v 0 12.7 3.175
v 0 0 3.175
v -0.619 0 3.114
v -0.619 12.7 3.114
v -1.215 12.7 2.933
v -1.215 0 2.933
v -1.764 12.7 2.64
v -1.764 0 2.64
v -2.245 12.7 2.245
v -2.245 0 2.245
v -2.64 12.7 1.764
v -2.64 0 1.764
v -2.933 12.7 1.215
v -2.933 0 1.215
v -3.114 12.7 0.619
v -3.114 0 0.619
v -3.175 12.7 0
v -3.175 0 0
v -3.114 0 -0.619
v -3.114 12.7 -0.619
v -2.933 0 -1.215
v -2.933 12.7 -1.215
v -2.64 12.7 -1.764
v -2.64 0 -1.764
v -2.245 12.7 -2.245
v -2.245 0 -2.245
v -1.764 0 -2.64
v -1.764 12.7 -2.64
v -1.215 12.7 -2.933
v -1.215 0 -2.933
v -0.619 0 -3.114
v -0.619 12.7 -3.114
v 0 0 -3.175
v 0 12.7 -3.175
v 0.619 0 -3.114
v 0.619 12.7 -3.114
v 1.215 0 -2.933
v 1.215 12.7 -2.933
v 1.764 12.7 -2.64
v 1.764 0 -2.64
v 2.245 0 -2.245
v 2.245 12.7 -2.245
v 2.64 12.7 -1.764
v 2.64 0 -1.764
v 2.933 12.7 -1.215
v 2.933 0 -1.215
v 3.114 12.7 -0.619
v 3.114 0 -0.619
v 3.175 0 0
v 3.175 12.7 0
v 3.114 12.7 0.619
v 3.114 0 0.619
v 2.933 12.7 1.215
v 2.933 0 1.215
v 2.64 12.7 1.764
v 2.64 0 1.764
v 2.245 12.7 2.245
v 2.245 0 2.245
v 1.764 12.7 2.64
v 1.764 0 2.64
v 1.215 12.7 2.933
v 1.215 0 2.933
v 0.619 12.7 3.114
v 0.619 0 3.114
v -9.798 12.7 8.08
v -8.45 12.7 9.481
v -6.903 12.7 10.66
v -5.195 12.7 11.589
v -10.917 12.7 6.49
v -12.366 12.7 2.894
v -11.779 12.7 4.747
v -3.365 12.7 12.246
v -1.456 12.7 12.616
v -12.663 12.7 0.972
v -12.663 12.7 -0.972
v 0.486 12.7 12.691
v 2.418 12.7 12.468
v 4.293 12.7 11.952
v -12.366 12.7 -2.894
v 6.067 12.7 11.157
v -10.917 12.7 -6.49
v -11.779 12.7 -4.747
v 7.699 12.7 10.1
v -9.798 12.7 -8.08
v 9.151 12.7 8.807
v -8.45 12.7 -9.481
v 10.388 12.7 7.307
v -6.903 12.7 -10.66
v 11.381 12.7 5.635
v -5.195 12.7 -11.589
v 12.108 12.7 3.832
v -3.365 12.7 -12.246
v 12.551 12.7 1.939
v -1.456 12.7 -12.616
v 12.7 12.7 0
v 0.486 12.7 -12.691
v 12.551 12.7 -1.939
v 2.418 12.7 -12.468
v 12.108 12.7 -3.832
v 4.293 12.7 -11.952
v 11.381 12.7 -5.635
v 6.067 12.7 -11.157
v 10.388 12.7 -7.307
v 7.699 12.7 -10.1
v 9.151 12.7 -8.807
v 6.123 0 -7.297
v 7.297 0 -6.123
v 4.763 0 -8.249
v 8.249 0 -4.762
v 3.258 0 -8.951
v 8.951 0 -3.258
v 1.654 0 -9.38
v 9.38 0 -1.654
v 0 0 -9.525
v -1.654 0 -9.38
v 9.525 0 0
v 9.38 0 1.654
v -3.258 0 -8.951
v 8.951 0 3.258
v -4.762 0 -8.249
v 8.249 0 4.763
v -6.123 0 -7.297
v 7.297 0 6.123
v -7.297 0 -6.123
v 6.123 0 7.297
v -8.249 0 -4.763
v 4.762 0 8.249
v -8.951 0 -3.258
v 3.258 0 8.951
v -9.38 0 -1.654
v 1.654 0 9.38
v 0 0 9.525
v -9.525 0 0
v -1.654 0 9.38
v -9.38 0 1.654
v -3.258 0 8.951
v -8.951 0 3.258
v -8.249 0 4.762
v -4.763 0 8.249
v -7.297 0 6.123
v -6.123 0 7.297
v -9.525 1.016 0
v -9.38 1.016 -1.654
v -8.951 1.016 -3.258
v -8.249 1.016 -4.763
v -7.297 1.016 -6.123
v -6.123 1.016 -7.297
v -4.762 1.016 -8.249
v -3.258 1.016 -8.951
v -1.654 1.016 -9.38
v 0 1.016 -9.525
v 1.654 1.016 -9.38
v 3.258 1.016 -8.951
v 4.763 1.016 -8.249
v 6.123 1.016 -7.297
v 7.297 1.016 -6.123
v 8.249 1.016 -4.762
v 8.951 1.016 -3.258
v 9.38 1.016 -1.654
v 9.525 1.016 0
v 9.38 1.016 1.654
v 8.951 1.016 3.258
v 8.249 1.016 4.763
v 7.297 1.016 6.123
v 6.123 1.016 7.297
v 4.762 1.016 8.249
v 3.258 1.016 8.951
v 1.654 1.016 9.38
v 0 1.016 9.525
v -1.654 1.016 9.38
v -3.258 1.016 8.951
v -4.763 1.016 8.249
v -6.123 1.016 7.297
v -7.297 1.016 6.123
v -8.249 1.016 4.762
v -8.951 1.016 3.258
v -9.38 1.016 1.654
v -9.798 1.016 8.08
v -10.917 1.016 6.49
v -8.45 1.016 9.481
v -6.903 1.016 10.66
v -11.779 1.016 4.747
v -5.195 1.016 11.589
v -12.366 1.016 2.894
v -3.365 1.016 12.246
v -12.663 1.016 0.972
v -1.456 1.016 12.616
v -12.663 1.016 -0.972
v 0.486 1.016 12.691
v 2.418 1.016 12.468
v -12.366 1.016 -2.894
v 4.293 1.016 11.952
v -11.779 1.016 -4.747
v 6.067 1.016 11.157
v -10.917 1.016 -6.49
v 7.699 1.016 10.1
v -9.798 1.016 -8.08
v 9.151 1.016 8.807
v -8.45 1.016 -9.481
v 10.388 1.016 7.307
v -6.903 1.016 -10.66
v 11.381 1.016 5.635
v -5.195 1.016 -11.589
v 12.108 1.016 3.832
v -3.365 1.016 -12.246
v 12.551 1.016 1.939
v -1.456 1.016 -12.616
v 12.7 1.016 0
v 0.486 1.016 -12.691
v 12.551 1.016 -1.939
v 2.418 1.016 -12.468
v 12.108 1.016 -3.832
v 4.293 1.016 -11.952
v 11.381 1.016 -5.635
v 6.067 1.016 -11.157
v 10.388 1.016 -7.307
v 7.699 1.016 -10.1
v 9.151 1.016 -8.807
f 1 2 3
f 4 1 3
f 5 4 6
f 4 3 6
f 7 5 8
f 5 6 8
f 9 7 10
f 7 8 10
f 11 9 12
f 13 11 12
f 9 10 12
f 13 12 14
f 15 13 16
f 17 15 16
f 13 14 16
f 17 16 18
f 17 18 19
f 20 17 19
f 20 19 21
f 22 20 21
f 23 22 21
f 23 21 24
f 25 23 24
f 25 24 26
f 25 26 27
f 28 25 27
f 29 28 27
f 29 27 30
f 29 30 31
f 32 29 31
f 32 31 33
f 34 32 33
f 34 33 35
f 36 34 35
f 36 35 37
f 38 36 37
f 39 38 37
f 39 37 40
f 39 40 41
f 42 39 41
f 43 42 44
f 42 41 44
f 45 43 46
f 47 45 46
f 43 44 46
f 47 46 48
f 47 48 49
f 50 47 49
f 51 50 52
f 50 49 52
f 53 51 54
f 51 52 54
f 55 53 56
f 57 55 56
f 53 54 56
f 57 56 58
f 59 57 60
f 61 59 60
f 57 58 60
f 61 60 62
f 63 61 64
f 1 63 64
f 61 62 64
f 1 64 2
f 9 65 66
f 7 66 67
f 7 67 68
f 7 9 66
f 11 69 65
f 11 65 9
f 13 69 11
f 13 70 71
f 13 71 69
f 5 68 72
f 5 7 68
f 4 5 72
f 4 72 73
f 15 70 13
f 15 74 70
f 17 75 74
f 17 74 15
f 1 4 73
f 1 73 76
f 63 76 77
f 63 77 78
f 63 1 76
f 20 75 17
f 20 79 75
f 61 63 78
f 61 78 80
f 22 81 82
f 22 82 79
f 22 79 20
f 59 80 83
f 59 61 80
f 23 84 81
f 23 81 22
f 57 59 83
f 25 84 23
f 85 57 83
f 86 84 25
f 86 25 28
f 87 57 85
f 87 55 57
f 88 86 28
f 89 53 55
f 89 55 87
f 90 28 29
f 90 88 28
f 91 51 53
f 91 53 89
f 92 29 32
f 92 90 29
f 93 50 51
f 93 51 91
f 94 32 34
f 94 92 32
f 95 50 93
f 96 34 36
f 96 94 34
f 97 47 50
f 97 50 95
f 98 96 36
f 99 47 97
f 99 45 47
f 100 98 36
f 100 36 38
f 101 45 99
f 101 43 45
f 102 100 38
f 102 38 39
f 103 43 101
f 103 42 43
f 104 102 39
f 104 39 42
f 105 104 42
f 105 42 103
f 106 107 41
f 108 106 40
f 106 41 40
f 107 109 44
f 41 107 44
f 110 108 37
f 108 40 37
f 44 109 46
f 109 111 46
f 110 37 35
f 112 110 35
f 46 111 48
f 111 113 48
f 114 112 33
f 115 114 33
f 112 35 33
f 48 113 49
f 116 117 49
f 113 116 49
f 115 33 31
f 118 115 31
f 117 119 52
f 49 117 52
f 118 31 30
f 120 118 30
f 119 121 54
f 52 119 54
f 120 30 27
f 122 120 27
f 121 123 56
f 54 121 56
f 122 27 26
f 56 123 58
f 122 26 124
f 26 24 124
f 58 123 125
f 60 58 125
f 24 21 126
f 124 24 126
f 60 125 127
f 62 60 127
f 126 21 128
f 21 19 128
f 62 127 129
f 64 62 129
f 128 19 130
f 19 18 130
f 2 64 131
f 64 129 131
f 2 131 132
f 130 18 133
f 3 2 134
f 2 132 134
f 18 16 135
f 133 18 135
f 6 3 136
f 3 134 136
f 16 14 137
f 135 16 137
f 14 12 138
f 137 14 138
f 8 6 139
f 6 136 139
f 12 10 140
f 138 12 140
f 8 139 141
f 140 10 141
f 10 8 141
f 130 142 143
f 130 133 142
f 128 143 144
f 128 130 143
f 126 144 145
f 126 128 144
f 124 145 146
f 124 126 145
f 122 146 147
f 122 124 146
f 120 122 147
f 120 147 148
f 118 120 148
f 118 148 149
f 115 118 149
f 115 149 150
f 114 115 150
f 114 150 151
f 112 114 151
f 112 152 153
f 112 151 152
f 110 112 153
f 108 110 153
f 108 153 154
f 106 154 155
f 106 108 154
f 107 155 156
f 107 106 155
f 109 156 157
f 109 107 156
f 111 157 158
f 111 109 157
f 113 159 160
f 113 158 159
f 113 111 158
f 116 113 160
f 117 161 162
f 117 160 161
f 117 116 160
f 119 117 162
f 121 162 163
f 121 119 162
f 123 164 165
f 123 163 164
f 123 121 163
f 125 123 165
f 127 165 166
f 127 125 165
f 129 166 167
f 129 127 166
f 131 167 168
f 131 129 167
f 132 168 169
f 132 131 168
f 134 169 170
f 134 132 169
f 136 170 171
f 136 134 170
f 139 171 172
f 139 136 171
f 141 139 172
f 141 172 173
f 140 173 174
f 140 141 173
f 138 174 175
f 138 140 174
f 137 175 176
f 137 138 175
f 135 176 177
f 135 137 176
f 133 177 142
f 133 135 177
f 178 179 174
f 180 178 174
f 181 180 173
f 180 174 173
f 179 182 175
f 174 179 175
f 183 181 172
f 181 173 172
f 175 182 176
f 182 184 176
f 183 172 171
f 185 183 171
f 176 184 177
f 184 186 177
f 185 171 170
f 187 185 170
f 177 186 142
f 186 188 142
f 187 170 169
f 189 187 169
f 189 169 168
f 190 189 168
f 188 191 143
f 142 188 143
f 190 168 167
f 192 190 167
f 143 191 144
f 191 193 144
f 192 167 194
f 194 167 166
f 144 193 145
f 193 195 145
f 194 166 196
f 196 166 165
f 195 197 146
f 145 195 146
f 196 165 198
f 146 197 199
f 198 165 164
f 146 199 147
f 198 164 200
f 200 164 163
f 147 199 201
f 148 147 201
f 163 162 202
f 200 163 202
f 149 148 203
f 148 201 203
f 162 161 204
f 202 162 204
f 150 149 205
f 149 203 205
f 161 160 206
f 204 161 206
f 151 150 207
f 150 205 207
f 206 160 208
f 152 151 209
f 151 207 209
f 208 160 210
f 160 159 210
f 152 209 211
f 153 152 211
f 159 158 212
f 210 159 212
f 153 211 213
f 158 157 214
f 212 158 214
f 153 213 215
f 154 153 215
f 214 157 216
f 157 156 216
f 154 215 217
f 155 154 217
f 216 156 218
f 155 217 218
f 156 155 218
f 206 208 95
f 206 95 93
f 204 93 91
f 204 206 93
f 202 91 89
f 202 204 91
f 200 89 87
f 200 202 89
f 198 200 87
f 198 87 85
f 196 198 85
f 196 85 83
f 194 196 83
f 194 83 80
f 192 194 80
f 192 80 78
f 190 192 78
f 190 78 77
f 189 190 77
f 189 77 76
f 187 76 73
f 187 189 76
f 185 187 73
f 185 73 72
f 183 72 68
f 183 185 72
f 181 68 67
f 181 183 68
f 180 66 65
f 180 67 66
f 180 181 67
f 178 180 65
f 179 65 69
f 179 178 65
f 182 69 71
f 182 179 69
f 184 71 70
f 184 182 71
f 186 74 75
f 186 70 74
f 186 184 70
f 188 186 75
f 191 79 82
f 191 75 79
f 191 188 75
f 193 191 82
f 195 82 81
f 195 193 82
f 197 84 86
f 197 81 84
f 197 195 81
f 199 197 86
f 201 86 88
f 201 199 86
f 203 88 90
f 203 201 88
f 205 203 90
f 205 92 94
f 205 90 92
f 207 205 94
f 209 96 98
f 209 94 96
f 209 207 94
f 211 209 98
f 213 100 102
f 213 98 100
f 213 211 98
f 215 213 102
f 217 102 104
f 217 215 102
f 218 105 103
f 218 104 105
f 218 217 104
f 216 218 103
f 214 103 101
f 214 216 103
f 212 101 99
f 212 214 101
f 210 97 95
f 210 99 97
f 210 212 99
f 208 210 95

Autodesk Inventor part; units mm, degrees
ref_plane "YZ Plane" through (0, 0, 0) normal (1, 0, 0) x (0, 1, 0)
ref_plane "XZ Plane" through (0, 0, 0) normal (0, 1, 0) x (-1, 0, 0)
ref_plane "XY Plane" through (0, 0, 0) normal (0, 0, 1) x (1, 0, 0)
sketch "Sketch1" plane through (0, 0, 0) normal (0, 1, 0) x (-1, 0, 0)
  circle A0 centre (0, 0) radius 9.525
  dimension "d0" = 19.05
extrude "Extrusion1" add sketch "Sketch1" along normal blind 1.016
sketch "Sketch2" plane through (0, 1.016, 0) normal (0, 1, 0) x (1, 0, 0)
  circle A0 centre (0, 0) radius 9.525 projected
  circle A1 centre (0, 0) radius 12.7
  dimension "d3" = 25.4
extrude "Extrusion2" add sketch "Sketch2" along normal blind 11.684 contours A0 | A1
hole "Hole1" at (0, 12.7, 0) direction (0, -1, 0) diameter 6.35 end through all
properties part number "Wing-Nut-Spacing-Test"
